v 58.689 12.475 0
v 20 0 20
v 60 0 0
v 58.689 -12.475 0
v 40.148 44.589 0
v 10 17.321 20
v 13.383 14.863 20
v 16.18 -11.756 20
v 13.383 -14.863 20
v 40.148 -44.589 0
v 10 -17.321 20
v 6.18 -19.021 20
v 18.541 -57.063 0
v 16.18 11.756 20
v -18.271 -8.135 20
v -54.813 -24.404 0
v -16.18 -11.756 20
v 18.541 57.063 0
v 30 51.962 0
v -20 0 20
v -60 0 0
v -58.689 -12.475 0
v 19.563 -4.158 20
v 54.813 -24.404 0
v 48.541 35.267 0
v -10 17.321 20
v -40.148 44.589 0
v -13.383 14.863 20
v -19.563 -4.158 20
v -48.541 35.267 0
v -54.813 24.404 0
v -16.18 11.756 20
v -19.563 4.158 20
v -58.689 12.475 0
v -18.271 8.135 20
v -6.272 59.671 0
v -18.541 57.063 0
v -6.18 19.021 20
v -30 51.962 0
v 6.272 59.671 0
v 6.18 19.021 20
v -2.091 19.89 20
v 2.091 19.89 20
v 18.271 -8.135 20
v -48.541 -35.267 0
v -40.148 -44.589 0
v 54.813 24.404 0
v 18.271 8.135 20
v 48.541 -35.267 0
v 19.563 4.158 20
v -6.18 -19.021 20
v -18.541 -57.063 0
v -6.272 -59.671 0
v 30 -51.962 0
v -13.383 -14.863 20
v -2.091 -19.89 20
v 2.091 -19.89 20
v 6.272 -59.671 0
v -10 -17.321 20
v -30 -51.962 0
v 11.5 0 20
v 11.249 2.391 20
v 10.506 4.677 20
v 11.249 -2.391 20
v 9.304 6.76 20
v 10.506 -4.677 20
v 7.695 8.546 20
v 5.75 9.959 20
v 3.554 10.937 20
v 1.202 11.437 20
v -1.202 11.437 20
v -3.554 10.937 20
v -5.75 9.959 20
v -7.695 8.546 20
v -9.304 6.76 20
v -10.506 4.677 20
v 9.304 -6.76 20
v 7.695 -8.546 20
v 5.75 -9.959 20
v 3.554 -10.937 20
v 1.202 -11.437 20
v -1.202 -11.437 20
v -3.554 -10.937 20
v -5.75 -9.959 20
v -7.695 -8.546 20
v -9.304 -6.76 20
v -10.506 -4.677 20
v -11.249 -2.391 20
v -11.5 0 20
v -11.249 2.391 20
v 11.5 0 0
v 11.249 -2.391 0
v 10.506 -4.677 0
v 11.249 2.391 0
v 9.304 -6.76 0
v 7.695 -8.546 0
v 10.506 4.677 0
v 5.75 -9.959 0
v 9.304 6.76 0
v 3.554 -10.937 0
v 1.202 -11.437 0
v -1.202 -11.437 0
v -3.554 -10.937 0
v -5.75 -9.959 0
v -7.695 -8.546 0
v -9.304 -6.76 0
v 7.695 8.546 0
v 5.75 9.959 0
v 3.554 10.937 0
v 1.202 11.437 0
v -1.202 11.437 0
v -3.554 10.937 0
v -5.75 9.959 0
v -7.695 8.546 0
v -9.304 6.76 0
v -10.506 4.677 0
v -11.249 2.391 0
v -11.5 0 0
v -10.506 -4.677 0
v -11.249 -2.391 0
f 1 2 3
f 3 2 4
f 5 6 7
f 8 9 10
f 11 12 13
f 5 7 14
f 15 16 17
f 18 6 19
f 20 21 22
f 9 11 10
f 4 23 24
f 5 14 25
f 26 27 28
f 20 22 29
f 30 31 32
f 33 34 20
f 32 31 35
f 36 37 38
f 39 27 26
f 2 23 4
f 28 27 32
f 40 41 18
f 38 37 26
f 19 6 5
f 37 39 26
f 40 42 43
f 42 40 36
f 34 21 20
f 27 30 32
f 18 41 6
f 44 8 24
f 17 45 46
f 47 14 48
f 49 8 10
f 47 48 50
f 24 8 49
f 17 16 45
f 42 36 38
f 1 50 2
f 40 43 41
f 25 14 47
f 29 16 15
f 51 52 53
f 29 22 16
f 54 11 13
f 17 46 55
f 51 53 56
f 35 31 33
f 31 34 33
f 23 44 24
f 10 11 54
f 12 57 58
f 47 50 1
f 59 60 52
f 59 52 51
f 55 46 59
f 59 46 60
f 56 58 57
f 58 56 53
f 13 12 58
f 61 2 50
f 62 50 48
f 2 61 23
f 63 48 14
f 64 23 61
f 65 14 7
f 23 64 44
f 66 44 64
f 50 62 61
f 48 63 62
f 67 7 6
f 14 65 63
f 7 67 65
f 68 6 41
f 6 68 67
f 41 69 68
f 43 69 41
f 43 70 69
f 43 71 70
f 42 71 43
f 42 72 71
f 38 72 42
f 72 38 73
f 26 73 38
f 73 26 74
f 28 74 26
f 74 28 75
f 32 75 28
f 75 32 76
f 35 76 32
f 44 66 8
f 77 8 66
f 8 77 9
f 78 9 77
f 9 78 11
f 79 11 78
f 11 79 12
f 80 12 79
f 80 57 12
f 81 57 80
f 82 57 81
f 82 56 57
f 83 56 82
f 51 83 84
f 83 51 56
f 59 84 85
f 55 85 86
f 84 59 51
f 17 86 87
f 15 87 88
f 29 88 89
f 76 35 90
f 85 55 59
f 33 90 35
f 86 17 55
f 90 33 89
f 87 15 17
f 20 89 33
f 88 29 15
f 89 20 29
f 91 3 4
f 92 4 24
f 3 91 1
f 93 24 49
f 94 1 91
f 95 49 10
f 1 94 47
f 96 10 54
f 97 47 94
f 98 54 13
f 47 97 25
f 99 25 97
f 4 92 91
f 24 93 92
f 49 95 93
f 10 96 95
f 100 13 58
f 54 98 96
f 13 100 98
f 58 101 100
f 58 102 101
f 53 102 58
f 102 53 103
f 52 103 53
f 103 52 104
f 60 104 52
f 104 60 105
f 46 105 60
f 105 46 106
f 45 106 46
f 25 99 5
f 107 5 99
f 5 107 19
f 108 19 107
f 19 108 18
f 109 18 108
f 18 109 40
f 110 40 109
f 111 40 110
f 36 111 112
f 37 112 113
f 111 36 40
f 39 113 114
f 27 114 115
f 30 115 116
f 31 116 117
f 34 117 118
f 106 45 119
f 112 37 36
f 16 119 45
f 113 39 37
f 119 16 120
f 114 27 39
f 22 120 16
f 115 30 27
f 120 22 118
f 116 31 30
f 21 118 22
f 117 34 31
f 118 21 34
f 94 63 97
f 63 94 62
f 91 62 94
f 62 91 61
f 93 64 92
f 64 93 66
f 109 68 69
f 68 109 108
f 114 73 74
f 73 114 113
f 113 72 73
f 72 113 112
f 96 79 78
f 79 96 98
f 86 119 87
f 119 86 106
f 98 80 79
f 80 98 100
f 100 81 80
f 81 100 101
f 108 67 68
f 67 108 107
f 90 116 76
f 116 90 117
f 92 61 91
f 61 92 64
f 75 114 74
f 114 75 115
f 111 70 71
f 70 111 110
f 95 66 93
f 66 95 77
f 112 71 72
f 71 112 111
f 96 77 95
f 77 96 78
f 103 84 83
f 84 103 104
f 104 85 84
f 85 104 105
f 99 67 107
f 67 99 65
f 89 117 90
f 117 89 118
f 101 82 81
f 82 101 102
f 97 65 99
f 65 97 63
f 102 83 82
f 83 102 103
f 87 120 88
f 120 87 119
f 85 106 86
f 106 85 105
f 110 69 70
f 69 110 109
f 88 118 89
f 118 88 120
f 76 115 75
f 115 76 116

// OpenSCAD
difference()
{
  cylinder(h=20, r1=120/2, r2=40/2); // main hull
  cylinder(h=20, r=(22+1)/2);        // center rod & bearings holding
}
